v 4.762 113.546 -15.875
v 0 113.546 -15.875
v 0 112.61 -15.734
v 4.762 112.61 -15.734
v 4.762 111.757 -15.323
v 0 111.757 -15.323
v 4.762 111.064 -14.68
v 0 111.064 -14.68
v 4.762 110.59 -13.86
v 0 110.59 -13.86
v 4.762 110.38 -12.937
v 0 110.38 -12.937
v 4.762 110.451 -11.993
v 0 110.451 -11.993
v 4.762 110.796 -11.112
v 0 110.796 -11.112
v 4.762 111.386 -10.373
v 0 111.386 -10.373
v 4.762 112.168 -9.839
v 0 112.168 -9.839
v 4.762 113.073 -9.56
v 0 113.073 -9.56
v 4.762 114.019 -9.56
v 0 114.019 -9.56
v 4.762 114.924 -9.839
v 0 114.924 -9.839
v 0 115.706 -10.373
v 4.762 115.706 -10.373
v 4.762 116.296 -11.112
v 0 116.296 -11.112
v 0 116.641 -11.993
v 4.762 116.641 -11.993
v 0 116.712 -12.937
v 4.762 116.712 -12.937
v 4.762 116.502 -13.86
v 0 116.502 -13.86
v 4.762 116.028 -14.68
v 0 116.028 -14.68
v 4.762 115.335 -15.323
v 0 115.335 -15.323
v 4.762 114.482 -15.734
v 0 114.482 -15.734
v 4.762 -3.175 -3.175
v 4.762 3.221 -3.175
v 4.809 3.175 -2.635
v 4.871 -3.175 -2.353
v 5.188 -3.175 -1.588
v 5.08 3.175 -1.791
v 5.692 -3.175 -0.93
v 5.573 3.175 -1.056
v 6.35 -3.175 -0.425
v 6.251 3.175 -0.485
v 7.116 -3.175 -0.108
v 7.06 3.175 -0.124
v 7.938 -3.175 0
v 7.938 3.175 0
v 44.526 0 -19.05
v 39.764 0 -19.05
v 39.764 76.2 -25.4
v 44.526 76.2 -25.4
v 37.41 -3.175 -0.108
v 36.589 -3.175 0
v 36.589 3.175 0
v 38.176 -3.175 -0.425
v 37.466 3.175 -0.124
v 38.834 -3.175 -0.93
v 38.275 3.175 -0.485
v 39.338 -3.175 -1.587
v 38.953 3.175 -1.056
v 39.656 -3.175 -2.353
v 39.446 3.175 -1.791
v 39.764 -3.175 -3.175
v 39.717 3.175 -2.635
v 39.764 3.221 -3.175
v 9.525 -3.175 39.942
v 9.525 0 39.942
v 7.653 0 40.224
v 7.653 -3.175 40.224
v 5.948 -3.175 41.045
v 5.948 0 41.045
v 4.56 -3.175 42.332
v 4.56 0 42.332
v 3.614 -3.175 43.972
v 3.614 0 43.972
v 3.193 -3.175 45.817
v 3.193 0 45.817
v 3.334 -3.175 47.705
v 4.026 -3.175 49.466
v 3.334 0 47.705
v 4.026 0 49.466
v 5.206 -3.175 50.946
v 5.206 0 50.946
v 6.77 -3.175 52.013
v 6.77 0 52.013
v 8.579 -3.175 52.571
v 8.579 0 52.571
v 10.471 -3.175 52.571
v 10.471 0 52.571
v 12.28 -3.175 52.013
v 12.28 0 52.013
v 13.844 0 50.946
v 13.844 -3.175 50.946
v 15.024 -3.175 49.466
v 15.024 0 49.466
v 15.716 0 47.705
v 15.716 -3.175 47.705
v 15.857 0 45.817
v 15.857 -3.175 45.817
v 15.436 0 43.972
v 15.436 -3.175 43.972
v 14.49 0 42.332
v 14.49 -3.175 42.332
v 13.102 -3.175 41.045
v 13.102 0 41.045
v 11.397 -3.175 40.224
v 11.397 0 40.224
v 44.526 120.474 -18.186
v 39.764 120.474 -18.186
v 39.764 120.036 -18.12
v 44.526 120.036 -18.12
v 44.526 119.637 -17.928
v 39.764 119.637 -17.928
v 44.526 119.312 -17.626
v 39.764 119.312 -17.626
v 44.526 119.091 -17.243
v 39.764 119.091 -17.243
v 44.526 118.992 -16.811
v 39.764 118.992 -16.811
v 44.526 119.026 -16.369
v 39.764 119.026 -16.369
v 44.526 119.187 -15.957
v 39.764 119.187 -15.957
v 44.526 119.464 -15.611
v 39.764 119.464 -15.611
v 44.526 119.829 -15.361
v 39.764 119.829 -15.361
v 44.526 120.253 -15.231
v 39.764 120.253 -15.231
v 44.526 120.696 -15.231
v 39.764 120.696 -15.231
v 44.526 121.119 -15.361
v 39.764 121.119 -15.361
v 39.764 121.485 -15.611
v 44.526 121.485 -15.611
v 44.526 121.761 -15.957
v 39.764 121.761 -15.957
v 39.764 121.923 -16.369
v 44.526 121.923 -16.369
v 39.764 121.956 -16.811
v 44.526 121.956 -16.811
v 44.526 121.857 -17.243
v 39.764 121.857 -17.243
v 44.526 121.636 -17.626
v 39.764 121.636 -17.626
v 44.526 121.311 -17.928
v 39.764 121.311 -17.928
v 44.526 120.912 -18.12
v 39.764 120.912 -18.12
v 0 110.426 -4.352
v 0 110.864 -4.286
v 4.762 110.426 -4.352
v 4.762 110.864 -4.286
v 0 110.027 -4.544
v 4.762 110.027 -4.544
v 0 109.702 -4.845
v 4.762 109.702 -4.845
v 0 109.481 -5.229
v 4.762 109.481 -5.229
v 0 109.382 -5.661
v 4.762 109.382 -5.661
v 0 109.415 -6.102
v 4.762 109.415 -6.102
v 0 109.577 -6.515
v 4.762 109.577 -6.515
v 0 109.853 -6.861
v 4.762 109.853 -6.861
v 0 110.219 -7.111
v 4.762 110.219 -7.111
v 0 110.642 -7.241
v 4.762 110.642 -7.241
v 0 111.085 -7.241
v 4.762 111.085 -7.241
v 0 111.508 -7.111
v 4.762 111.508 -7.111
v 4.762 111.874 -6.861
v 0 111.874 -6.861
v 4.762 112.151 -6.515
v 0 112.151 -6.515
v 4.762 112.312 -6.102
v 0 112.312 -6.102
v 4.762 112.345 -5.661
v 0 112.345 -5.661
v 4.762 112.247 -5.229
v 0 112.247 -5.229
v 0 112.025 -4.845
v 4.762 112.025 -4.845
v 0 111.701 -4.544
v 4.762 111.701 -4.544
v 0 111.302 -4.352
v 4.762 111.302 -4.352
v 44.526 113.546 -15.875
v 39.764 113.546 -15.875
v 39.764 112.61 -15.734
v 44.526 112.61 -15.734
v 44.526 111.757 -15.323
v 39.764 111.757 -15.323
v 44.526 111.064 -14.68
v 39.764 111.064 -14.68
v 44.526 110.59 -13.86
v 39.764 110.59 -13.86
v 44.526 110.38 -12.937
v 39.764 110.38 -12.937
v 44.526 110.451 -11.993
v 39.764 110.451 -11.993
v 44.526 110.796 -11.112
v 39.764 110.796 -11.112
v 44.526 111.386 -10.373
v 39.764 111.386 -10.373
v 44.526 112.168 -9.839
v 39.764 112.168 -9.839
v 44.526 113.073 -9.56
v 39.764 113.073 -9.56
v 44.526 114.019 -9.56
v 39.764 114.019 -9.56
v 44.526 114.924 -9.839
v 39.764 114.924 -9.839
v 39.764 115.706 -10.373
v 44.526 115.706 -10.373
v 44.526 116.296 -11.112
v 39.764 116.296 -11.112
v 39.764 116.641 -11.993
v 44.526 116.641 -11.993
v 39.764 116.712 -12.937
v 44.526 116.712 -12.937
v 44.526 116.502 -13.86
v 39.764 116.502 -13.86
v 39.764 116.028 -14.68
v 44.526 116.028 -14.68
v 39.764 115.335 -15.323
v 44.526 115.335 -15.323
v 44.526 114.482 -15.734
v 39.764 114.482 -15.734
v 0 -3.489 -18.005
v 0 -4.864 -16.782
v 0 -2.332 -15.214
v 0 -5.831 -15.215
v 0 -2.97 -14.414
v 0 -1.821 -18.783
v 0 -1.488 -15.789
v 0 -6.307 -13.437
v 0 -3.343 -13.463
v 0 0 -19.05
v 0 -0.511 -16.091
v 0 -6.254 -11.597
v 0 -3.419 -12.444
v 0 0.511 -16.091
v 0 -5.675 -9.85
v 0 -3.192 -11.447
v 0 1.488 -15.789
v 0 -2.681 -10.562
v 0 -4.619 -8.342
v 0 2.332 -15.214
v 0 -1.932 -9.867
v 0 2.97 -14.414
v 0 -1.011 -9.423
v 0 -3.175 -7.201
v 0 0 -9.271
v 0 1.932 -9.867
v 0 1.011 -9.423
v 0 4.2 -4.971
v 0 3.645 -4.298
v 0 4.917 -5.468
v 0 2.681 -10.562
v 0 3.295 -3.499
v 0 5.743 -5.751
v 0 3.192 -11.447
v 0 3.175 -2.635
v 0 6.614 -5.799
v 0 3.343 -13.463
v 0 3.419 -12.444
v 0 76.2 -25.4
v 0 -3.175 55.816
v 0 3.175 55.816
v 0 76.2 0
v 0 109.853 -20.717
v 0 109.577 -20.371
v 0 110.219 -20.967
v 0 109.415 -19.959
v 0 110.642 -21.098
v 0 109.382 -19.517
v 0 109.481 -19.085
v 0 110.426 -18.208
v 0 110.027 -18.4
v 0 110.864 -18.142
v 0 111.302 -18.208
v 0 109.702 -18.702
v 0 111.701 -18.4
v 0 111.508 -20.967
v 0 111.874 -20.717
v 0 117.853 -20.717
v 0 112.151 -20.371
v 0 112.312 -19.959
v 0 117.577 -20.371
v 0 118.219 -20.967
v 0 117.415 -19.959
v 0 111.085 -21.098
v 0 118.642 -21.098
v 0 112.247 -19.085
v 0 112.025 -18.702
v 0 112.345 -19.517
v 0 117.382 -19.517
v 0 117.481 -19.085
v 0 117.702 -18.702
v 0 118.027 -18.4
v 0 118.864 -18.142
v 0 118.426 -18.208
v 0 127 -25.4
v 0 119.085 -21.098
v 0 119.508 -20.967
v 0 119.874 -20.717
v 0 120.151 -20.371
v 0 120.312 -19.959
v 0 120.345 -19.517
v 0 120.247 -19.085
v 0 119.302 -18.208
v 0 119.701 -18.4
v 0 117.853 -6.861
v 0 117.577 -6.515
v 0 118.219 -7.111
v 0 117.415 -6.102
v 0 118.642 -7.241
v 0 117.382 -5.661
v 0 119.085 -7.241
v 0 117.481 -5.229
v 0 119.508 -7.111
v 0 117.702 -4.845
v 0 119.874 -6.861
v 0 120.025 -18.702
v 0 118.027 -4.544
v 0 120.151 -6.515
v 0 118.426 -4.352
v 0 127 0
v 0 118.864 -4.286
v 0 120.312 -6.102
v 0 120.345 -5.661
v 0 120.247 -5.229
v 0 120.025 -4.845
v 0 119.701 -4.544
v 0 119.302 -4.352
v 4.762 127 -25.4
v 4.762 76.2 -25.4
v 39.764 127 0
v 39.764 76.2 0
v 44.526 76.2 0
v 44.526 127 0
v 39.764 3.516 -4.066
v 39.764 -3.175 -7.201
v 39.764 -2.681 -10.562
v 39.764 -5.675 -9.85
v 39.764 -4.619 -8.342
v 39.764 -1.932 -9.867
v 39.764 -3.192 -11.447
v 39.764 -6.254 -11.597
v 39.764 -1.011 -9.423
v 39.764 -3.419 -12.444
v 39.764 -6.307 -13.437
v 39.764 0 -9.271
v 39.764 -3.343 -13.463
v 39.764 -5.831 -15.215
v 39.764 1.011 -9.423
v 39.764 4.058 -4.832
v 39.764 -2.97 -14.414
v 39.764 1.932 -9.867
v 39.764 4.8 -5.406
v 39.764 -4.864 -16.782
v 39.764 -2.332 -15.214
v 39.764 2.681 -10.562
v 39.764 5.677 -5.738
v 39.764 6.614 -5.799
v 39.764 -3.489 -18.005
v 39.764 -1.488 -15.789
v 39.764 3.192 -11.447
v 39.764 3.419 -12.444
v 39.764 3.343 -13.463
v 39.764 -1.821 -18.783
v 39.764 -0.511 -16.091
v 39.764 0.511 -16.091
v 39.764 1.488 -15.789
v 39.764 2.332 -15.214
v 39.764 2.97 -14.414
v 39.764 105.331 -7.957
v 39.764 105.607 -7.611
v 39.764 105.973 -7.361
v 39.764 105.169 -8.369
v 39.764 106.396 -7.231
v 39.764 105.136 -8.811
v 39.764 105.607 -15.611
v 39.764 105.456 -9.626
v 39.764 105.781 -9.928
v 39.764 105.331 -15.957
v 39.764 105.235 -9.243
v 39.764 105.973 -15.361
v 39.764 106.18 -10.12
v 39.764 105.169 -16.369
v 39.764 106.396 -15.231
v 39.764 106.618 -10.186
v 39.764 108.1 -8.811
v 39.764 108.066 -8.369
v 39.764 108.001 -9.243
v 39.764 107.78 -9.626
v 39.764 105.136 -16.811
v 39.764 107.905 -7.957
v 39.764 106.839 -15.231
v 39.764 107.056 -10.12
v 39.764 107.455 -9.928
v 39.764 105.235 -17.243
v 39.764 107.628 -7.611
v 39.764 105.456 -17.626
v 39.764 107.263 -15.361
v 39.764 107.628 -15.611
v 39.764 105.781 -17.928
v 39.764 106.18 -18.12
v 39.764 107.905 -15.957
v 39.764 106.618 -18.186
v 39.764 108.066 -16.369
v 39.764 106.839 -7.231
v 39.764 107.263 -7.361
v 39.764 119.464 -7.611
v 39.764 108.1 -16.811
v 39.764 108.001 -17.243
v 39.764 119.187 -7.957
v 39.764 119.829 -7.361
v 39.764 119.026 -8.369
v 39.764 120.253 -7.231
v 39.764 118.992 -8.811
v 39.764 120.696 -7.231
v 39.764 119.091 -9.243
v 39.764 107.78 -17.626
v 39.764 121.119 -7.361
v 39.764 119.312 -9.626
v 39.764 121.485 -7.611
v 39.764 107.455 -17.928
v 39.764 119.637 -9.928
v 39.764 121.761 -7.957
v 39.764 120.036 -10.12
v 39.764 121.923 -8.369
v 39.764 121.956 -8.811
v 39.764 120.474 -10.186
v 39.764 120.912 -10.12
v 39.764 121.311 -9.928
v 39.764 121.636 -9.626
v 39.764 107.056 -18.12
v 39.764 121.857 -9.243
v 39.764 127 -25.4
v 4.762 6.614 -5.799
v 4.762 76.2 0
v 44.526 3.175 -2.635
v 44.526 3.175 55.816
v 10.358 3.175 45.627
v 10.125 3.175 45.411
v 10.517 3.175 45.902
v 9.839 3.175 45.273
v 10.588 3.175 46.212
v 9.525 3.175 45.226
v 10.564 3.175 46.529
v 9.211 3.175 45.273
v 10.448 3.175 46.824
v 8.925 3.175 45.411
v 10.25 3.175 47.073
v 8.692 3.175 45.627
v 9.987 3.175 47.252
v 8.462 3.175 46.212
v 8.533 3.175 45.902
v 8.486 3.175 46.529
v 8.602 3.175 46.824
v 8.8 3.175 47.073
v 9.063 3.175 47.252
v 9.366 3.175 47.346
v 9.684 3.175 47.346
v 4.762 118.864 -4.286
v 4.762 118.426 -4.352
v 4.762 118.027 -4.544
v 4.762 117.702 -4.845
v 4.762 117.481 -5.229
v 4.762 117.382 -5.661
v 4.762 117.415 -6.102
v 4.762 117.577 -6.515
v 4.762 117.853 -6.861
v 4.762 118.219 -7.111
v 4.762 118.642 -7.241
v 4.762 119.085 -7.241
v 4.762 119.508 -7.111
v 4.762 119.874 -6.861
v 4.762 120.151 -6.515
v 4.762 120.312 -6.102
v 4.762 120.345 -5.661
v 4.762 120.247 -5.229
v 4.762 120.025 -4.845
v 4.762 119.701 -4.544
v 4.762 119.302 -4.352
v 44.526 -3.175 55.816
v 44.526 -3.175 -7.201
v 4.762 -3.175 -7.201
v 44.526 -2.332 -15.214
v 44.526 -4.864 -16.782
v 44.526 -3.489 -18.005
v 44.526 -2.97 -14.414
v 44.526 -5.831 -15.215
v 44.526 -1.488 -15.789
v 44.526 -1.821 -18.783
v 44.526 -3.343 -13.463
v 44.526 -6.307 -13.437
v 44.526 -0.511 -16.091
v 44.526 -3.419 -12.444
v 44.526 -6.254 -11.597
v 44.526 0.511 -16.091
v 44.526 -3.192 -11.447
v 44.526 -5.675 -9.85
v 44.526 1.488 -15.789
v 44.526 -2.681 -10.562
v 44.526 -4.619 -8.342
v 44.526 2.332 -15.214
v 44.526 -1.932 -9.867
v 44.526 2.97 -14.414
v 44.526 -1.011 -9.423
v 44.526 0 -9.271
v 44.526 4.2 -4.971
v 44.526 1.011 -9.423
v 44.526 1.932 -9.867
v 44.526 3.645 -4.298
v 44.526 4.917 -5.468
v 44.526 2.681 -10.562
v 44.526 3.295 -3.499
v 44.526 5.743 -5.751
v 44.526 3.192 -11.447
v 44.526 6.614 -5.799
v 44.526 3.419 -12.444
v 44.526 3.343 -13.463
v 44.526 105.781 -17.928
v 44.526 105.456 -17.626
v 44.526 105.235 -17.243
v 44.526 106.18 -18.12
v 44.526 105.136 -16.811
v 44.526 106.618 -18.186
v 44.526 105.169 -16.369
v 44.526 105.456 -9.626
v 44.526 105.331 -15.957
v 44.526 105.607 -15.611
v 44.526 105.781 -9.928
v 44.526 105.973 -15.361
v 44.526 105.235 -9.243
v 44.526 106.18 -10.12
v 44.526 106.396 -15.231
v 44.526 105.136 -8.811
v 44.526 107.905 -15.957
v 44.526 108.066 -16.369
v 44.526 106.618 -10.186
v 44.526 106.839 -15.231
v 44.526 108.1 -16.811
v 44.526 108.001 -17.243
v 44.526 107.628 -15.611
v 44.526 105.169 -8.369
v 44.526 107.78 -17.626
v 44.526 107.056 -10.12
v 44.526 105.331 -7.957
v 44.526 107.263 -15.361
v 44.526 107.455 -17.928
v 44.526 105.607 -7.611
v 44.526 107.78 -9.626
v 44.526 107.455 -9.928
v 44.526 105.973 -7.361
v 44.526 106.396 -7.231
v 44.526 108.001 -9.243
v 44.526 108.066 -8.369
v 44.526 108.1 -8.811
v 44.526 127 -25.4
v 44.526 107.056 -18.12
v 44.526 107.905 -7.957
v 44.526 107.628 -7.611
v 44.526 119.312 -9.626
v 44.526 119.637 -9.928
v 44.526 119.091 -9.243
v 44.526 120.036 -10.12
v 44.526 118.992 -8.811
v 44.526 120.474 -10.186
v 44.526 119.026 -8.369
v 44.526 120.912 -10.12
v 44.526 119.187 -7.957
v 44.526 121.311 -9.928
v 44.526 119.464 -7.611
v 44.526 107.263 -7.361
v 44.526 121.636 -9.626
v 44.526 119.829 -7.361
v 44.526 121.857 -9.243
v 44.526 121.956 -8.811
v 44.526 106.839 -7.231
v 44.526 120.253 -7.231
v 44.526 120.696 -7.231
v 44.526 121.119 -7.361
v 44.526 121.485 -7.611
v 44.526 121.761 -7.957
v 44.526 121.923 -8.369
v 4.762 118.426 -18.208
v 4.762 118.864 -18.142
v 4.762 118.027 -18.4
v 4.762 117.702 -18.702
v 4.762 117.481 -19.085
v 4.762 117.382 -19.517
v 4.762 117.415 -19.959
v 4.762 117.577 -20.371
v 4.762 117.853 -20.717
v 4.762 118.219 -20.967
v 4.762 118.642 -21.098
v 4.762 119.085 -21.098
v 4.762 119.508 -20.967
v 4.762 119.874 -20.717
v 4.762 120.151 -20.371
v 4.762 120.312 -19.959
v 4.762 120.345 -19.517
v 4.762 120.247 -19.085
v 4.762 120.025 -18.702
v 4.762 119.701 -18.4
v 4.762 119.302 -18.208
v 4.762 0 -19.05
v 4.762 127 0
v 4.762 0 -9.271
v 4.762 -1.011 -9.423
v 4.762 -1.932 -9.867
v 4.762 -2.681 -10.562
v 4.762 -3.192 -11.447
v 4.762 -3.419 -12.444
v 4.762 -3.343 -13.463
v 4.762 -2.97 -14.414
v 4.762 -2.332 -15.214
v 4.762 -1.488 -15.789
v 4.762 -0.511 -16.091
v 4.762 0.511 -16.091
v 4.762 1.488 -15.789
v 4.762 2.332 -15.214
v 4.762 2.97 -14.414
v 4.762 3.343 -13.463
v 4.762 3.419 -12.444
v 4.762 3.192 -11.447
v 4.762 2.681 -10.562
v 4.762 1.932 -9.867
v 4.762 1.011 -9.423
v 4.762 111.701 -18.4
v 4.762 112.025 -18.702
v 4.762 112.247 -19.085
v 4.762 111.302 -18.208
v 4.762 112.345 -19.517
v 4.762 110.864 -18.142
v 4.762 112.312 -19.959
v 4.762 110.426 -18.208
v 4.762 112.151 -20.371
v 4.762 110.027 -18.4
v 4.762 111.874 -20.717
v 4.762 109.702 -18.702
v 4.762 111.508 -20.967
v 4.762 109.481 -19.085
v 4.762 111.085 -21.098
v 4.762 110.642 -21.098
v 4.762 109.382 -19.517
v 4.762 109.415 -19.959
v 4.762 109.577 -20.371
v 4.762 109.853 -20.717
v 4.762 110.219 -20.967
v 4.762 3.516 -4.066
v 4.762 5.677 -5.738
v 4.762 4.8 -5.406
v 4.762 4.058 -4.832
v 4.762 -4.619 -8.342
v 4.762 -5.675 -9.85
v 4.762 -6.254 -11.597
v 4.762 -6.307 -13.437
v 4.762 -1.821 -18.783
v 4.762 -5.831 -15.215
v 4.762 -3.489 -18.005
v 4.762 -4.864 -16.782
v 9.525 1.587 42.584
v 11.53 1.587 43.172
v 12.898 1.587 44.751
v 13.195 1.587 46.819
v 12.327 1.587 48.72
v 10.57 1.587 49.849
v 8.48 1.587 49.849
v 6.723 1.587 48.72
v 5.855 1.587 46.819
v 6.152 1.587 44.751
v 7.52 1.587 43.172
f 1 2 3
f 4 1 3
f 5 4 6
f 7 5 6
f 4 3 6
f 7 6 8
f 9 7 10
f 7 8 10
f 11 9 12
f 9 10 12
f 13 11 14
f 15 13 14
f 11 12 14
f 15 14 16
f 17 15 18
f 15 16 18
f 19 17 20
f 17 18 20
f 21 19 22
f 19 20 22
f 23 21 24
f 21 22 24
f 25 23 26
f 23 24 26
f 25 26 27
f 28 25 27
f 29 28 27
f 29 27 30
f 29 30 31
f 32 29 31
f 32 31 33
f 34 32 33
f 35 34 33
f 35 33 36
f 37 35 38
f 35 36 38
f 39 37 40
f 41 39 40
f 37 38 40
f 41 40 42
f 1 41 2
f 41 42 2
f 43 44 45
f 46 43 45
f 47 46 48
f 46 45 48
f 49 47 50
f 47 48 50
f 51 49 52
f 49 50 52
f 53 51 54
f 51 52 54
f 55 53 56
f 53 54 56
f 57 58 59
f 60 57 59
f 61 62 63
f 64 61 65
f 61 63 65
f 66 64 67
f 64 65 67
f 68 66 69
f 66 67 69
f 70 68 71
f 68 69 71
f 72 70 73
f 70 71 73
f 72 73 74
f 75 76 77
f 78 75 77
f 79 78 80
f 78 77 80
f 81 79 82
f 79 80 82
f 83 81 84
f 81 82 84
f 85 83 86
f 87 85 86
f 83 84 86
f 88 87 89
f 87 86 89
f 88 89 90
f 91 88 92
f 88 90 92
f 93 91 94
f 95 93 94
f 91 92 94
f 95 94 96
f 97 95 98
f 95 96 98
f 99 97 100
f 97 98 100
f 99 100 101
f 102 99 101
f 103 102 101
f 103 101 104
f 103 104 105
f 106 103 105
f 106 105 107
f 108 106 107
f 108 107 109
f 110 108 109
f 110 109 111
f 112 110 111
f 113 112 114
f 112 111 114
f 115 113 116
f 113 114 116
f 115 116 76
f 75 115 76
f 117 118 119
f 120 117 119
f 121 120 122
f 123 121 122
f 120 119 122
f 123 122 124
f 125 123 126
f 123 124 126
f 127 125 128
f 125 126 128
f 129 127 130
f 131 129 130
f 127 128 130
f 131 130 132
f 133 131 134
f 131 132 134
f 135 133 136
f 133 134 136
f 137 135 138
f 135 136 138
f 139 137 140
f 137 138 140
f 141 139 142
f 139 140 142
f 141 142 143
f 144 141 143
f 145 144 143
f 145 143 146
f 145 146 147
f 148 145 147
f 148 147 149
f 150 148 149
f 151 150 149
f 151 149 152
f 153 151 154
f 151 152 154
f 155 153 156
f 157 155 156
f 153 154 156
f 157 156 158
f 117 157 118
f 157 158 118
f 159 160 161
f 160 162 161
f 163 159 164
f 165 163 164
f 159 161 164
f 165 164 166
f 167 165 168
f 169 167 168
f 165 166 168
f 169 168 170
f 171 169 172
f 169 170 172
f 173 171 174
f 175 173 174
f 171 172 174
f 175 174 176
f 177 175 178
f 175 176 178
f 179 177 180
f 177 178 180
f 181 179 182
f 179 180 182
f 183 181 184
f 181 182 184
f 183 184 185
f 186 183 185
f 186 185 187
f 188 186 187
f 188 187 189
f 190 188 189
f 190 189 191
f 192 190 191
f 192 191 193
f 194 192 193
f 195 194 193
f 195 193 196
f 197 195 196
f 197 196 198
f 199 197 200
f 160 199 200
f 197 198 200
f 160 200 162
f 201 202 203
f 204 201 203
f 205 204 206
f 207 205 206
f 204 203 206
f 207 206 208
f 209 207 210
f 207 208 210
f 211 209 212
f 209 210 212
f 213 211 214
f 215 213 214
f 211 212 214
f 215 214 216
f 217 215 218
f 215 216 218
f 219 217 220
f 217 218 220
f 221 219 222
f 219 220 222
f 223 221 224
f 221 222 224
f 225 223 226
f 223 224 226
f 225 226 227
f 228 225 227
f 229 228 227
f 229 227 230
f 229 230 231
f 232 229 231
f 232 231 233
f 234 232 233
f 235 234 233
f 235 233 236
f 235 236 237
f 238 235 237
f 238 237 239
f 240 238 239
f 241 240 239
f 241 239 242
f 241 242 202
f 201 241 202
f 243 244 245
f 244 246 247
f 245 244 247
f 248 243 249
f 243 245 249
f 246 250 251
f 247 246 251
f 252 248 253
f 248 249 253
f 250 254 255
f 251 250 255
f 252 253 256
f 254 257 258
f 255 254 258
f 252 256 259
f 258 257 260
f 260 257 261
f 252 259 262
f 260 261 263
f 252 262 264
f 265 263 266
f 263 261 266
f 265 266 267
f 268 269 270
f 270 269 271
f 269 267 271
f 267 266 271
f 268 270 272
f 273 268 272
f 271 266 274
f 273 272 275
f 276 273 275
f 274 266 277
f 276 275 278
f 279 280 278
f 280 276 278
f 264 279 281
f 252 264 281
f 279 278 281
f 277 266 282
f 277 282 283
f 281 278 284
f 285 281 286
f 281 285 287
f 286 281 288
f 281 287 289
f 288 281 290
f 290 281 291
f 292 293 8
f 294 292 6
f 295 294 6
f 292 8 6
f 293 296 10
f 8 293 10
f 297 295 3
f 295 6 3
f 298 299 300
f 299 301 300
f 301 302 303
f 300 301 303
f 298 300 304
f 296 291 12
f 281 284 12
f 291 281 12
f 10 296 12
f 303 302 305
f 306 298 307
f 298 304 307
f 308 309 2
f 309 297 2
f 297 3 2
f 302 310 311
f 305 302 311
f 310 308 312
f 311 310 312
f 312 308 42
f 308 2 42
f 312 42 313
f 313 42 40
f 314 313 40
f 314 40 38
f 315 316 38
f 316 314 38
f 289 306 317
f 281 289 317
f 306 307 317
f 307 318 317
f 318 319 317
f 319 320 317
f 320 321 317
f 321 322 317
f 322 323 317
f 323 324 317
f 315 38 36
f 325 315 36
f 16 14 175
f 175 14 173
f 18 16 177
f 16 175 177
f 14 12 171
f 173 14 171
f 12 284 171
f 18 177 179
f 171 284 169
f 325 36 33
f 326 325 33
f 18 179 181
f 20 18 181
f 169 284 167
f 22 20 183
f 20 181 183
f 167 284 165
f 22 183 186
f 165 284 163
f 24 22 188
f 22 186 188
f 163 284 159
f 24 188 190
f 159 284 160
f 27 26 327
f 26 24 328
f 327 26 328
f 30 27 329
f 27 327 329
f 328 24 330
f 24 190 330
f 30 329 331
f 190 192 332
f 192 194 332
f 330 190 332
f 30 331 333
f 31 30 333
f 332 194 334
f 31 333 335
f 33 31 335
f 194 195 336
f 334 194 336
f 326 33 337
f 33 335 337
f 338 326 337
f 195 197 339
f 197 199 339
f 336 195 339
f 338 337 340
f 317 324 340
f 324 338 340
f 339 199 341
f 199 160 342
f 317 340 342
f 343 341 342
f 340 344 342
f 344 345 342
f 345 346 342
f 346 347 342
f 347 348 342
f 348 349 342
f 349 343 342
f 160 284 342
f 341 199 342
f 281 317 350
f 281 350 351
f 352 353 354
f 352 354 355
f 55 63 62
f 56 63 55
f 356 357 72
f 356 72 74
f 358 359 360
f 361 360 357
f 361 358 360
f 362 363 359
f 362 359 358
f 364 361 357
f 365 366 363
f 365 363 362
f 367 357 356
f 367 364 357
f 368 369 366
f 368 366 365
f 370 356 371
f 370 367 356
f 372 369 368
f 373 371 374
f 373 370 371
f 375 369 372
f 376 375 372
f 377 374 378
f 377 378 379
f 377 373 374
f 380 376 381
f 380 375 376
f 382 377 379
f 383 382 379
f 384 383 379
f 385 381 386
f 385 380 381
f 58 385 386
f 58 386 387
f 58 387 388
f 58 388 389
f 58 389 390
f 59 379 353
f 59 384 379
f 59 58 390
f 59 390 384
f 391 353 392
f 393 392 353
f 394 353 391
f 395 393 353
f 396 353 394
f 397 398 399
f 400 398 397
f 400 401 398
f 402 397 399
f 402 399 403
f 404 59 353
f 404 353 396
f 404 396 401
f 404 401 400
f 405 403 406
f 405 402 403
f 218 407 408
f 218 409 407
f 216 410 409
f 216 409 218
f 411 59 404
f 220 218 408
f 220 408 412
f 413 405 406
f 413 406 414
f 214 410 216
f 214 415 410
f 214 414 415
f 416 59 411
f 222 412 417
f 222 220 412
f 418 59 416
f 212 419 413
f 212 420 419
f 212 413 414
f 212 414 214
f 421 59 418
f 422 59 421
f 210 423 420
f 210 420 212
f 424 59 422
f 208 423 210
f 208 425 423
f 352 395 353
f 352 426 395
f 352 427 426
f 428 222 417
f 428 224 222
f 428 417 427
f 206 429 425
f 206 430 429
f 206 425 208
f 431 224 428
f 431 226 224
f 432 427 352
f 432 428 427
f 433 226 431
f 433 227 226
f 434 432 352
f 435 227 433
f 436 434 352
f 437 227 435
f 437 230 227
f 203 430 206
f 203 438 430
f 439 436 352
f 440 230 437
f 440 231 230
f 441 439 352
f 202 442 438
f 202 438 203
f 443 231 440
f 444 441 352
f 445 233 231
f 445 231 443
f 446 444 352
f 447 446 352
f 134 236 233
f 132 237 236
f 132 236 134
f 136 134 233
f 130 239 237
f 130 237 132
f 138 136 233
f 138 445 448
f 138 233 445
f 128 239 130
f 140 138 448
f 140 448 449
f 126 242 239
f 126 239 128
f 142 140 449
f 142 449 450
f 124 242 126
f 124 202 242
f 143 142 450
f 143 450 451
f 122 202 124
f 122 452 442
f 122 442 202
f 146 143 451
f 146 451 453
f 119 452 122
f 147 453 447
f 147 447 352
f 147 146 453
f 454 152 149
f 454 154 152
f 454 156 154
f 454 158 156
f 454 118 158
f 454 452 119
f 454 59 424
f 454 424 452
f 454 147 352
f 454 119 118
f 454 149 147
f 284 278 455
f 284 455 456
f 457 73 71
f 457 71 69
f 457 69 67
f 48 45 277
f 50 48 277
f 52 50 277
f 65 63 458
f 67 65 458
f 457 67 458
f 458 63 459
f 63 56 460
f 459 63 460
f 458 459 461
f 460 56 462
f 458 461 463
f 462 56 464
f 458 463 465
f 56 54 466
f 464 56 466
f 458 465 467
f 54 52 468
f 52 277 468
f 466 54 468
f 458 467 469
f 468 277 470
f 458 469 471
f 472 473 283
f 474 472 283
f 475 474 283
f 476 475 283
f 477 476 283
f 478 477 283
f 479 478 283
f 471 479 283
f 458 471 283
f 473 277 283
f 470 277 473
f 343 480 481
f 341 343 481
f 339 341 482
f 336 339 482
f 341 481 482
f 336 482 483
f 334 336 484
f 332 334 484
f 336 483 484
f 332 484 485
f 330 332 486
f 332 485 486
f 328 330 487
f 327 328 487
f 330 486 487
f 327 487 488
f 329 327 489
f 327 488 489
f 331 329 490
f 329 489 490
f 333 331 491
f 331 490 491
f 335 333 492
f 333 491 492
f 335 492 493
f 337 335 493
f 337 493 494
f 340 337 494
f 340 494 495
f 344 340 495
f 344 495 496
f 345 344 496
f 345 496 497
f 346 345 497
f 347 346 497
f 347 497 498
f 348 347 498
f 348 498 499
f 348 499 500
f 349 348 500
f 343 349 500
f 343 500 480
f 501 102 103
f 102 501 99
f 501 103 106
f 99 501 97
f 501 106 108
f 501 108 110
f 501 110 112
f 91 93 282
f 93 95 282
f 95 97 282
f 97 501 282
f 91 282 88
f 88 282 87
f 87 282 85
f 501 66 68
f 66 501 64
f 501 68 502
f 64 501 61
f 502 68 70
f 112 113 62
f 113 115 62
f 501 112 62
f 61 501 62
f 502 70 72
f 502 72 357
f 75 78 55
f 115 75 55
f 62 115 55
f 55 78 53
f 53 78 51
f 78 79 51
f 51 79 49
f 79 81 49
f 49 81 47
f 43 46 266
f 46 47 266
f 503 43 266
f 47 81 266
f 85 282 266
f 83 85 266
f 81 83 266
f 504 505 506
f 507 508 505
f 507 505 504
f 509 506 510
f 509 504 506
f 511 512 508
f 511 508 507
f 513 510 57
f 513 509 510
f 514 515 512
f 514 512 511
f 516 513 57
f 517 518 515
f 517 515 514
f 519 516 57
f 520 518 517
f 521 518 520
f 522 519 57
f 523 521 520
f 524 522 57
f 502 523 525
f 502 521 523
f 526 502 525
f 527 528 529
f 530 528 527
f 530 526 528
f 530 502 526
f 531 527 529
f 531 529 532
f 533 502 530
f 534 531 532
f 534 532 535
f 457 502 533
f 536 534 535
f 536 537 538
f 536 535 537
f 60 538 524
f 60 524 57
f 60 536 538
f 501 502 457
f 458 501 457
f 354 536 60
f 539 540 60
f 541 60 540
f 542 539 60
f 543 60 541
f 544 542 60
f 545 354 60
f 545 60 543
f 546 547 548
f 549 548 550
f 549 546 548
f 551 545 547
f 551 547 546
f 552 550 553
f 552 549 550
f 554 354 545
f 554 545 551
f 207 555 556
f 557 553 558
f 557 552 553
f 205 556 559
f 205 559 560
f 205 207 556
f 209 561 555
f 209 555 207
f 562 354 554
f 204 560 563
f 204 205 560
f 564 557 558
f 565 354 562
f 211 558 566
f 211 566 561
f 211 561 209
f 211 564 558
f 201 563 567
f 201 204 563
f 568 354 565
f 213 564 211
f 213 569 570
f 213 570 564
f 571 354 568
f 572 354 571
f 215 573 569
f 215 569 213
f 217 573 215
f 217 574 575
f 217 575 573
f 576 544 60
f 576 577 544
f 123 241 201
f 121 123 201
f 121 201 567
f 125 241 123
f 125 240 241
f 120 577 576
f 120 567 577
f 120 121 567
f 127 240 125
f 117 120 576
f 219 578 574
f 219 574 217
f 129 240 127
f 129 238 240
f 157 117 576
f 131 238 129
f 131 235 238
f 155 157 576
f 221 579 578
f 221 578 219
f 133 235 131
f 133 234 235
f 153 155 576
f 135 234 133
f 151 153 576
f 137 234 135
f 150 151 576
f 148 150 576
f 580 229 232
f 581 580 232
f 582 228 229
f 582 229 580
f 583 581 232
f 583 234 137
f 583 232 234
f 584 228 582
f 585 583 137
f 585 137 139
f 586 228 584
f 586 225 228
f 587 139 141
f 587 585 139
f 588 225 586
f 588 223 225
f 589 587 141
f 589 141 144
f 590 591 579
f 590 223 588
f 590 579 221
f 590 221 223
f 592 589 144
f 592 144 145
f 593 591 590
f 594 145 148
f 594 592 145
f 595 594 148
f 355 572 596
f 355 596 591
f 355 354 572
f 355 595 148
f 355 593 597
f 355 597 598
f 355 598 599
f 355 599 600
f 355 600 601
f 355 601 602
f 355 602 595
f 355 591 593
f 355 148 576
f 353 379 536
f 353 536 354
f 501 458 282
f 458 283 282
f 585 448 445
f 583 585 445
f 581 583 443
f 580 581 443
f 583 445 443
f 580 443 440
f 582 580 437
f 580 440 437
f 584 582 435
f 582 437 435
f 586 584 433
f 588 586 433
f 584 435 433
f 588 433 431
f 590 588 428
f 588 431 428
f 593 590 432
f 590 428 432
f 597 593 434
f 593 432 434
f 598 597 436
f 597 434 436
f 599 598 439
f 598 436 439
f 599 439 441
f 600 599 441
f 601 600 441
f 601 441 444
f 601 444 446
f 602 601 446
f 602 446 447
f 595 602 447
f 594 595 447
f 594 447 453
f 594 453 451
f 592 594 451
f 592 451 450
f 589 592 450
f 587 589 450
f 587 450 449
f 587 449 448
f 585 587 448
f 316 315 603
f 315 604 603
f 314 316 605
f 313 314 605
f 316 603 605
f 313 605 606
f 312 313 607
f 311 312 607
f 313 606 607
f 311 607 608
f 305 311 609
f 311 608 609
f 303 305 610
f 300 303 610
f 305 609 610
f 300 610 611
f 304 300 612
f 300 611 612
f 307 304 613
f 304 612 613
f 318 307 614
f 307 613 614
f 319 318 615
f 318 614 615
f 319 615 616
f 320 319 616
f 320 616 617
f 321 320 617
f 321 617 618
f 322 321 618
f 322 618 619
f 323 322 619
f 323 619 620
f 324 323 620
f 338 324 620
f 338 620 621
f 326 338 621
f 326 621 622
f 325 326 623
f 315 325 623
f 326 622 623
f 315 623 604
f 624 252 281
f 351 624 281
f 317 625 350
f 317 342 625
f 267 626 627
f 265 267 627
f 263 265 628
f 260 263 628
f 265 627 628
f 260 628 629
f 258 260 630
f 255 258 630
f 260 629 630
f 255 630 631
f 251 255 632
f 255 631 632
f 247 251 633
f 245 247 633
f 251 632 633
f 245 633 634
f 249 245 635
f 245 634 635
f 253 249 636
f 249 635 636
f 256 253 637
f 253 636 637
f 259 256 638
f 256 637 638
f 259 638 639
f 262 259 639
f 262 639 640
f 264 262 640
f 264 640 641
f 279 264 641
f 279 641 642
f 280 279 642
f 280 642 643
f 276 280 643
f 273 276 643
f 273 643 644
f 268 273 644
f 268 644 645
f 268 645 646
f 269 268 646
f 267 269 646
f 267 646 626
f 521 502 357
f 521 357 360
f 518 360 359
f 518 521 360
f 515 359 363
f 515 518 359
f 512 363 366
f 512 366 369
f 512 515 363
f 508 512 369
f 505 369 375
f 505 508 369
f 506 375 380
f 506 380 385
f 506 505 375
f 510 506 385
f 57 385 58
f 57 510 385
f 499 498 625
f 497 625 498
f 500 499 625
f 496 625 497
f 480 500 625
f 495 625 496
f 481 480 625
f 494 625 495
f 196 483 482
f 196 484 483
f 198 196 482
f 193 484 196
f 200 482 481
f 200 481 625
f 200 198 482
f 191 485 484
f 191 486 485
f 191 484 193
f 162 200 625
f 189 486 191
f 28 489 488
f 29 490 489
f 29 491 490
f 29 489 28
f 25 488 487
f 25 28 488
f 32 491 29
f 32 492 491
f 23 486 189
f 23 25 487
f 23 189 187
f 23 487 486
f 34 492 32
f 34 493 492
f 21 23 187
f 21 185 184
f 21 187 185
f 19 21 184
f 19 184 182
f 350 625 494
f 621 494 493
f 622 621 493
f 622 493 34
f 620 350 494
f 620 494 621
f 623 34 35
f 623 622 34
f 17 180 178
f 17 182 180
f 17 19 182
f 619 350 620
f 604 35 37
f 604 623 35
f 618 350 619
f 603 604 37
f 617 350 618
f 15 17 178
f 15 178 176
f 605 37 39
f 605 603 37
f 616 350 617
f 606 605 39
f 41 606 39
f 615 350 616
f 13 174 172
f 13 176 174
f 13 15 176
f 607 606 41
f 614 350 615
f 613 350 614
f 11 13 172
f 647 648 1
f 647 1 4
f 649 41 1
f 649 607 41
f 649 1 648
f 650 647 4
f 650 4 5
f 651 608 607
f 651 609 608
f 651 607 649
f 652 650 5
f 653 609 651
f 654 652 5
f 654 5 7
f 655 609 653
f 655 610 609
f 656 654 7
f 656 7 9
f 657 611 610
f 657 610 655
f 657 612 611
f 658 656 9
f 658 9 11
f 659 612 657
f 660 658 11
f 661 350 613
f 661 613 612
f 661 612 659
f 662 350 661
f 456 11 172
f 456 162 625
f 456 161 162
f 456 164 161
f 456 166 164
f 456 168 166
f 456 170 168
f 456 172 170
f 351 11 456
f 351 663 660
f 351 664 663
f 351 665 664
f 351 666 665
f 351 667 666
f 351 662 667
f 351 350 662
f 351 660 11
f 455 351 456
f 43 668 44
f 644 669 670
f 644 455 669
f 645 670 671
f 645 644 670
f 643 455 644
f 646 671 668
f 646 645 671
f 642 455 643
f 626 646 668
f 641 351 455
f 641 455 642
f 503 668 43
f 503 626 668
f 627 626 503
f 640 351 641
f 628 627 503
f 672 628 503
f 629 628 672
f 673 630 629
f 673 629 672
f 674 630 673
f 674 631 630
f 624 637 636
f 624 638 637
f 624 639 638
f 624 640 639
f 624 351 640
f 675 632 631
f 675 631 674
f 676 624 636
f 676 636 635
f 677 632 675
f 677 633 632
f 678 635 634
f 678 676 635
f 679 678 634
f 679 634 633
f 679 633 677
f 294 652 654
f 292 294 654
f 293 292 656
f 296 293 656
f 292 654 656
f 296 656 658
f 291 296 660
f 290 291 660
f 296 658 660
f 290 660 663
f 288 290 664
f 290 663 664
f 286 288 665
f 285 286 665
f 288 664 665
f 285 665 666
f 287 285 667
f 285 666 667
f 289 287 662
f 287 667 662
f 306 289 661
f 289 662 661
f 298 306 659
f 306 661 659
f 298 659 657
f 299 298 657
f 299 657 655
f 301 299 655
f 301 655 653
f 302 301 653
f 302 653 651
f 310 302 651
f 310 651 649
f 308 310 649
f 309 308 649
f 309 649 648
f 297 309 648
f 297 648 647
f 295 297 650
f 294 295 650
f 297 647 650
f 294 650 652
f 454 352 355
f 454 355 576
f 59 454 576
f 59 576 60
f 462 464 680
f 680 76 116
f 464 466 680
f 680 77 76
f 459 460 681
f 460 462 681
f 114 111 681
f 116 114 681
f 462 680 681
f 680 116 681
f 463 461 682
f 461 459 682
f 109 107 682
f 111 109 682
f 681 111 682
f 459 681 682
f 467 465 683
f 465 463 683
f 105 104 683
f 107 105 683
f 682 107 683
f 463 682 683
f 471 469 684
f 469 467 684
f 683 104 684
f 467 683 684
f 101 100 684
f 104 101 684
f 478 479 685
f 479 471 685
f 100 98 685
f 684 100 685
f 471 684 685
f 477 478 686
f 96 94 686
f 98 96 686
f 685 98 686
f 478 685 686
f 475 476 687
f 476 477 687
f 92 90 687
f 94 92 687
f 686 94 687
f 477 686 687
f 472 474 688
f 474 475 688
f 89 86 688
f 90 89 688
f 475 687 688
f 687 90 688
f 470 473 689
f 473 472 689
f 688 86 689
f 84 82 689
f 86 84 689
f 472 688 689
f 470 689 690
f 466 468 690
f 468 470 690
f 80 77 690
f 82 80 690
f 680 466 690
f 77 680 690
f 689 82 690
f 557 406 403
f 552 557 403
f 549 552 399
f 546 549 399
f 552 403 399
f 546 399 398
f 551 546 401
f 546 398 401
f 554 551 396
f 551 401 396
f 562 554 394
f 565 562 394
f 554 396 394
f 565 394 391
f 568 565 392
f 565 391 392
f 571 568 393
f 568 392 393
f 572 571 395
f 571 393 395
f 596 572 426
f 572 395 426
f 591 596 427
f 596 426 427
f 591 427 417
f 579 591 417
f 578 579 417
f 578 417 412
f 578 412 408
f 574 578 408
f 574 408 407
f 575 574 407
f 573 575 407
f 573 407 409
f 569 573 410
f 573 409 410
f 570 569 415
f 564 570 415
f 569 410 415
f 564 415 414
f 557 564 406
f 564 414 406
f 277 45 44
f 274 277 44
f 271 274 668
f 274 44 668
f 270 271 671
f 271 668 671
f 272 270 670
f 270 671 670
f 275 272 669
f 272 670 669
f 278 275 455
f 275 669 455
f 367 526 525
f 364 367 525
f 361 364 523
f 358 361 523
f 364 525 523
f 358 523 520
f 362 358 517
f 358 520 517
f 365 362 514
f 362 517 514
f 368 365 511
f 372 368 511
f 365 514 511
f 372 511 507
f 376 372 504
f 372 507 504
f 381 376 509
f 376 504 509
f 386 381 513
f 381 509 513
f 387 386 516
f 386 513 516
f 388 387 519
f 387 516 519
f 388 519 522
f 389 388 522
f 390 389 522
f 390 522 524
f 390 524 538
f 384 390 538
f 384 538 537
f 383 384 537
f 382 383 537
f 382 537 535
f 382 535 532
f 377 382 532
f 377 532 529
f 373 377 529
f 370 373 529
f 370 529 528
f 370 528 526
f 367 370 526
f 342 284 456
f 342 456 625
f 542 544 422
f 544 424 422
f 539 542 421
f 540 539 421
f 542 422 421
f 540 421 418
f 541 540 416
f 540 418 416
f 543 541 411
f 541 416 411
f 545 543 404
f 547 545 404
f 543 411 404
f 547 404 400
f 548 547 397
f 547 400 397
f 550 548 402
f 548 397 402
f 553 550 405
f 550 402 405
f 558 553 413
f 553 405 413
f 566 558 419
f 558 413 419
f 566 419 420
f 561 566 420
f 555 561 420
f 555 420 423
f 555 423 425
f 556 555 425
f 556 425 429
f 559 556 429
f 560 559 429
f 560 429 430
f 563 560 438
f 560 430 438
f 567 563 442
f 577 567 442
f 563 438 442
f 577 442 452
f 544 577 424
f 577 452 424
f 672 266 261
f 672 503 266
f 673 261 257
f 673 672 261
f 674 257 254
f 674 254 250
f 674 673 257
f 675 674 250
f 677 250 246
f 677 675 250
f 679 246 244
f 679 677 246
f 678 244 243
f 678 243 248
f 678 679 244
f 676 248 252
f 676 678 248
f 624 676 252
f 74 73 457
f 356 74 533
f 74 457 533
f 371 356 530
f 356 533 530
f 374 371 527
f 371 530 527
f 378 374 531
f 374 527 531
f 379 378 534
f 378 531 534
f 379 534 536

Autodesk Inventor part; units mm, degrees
ref_plane "YZ Plane" through (0, 0, 0) normal (1, 0, 0) x (0, 1, 0)
ref_plane "XZ Plane" through (0, 0, 0) normal (0, 1, 0) x (-1, 0, 0)
ref_plane "XY Plane" through (0, 0, 0) normal (0, 0, 1) x (1, 0, 0)
sketch "Sketch1" plane through (0, 0, 0) normal (1, 0, 0) x (0, 1, 0)
  line L0 (0, 0) -> (127, 0)
  line L1 (127, 0) -> (127, -25.4)
  line L2 (127, -25.4) -> (0, -25.4)
  line L3 (0, -25.4) -> (0, 0)
  line L4 (0, -6.35) -> (0, -19.05)
  line L5 (0, -6.35) -> (76.2, 0)
  line L6 (0, -19.05) -> (76.2, -25.4)
  dimension "d0" = 127
  dimension "d1" = 25.4
  dimension "d18" = 12.7
  dimension "d19" = 6.35
  dimension "d20" = 50.8
  dimension "d21" = 50.8
ref_plane "Work Plane1" through (44.5262, 0, 0) normal (1, 0, 0) x (0, 0, -1)
sketch "Sketch2" plane through (44.5262, 0, 0) normal (1, 0, 0) x (0, 0, -1)
  line L0 (0, 127) -> (0, 0) projected
  line L1 (0, 0) -> (25.4, 0) projected
  line L2 (25.4, 0) -> (25.4, 127) projected
  line L3 (25.4, 127) -> (0, 127) projected
  line L4 (0, 0) -> (25.4, 0) projected
  circle A0 centre (12.7, 0) radius 6.35
  dimension "d5" = 25.4
  dimension "d6" = 12.7
  dimension "d7" = 12.7
  dimension "d8" = 0
extrude "Extrusion2" add sketch "Sketch2" against normal blind 44.5262 contours A0 L1 | L1 A0
ref_plane "Work Plane2" through (44.5262, 0, 0) normal (1, 0, 0) x (0, 0, -1)
extrude "Extrusion3" add sketch "Sketch1" along normal blind 44.5262 contours L0 L1 L2 L6 L3 L5
sketch "Sketch4" plane through (0, 0, 0) normal (-1, 0, 0) x (0, 0, 1)
  arc A0 (-19.05, 0) -> (-6.35, 0) centre (-12.7, 0) ccw projected
  line L0 (0, 76.2) -> (-6.35, 0) projected
  line L1 (0, 127) -> (0, 76.2) projected
  line L2 (-25.4, 127) -> (0, 127) projected
  line L3 (-25.4, 76.2) -> (-25.4, 127) projected
  line L4 (-19.05, 0) -> (-25.4, 76.2) projected
  point P0 (0, 0)
hole "Hole2" at (0, 0, -12.7) direction (1, 0, 0) diameter 6.858 end through all
sketch "Sketch5" plane through (0, 0, 0) normal (-1, 0, 0) x (0, 0, 1)
  circle A0 centre (-12.7, 0) radius 3.429 projected
  line L0 (0, 76.2) -> (-6.35, 0) projected
  line L1 (0, 127) -> (0, 76.2) projected
  line L2 (-25.4, 127) -> (0, 127) projected
  line L3 (-25.4, 76.2) -> (-25.4, 127) projected
  line L4 (-19.05, 0) -> (-25.4, 76.2) projected
  line L5 (-7.6835, 3.175) -> (55.8165, 3.175)
  line L6 (55.8165, 3.175) -> (55.8165, -3.175)
  line L7 (55.8165, -3.175) -> (-7.6835, -3.175)
  line L8 (-7.6835, -3.175) -> (-7.6835, 3.175)
  arc A1 (-19.05, 0) -> (-6.35, 0) centre (-12.7, 0) ccw projected
  point P0 (0, 0)
  dimension "d31" = 63.5
  dimension "d32" = 6.35
  dimension "d35" = 127
  dimension "d36" = 123.825
  dimension "d95" = 6.858
  dimension "d96" = 5.0165
extrude "Extrusion4" add sketch "Sketch5" against normal blind 44.5262 contours L5 L6 L7 A1 L0 | L0 A1 L7 L8 L5
sketch "Sketch8" plane through (0, 76.2, -25.4) normal (0, 0, -1) x (-1, 0, 0)
  line L0 (0, 0) -> (0, 50.8) projected
  line L1 (0, 50.8) -> (-44.5262, 50.8) projected
  line L2 (-44.5262, 0) -> (-44.5262, 50.8) projected
  line L3 (0, 0) -> (-44.5262, 0) projected
  line L4 (0, -76.2) -> (0, 0) projected
  line L5 (0, 0) -> (-44.5262, 0) projected
  line L6 (-44.5262, -76.2) -> (-44.5262, 0) projected
  line L7 (0, 50.8) -> (-44.5262, 50.8) projected
  line L8 (-39.7637, 50.8) -> (-4.7625, 50.8)
  line L9 (-4.7625, 50.8) -> (-4.7625, -98.425)
  line L10 (-4.7625, -98.425) -> (-39.7637, -98.425)
  line L11 (-39.7637, -98.425) -> (-39.7637, 50.8)
  line L12 (0, -76.2) -> (-44.5262, -76.2) projected
  point P0 (0, -76.2)
  dimension "d41" = 44.5262
  dimension "d43" = 35.0012
  dimension "d44" = 4.7625
  dimension "d45" = 149.225
extrude "Extrusion5" cut sketch "Sketch8" against normal blind 25.4 contours L9 L12 L11 L3 | L3 L11 L1 L9 | L9 L10 L11 L12
fillet "Fillet1" radius 3.175 2 edges at (39.7637, 0, 0) (4.7625, 0, 0)
fillet "Fillet2" radius 3.175 2 edges at (2.3812, 3.175, -6.0854) (42.1449, 3.175, -6.0854)
sketch "Sketch9" plane through (0, 0, 0) normal (-1, 0, 0) x (0, 0, 1)
  line L0 (0, 76.2) -> (-5.7989, 6.6137) projected
  line L1 (0, 127) -> (0, 76.2) projected
  line L2 (-25.4, 127) -> (0, 127) projected
  line L3 (-25.4, 76.2) -> (-25.4, 127) projected
  line L4 (-19.05, 0) -> (-25.4, 76.2) projected
  circle A0 centre (-12.7, 0) radius 3.429 projected
  circle A1 centre (-12.7, 114.8637) radius 8
  line L5 (-19.6282, 118.8637) -> (-5.7718, 118.8637)
  line L6 (-5.7718, 118.8637) -> (-5.7718, 110.8637)
  line L7 (-5.7718, 110.8637) -> (-19.6282, 110.8637)
  line L8 (-19.6282, 110.8637) -> (-19.6282, 118.8637)
  arc A2 (-19.05, 0) -> (-7.2007, -3.175) centre (-12.7, 0) ccw projected
  line L9 (55.8165, -3.175) -> (-7.2007, -3.175) projected
  line L10 (55.8165, 3.175) -> (55.8165, -3.175) projected
  line L11 (-2.6348, 3.175) -> (55.8165, 3.175) projected
  arc A3 (-5.7989, 6.6137) -> (-2.6348, 3.175) centre (-2.6348, 6.35) ccw projected
  point P0 (0, 0)
  dimension "d50" = 16
  dimension "d51" = 25.4
  dimension "d52" = 12.7
  dimension "d53" = 8
  dimension "d54" = 4
hole "Hole3" at (0, 118.8637, -19.6282) at (0, 110.8637, -19.6282) at (0, 118.8637, -5.7718) at (0, 110.8637, -5.7718) direction (1, 0, 0) diameter 2.9718 depth 25.4 tip angle 118
sketch "Sketch10" plane through (44.5262, 0, 0) normal (1, 0, 0) x (0, 0, -1)
  line L0 (19.05, 0) -> (25.4, 76.2) projected
  line L1 (25.4, 76.2) -> (25.4, 127) projected
  line L2 (25.4, 127) -> (0, 127) projected
  line L3 (0, 127) -> (0, 76.2) projected
  line L4 (0, 76.2) -> (5.7989, 6.6137) projected
  circle A0 centre (12.7, 0) radius 3.429 projected
  circle A1 centre (12.7, 113.546) radius 8
  line L5 (16.7, 106.6178) -> (8.7, 106.6178)
  line L6 (8.7, 106.6178) -> (8.7, 120.4742)
  line L7 (8.7, 120.4742) -> (16.7, 120.4742)
  line L8 (16.7, 120.4742) -> (16.7, 106.6178)
  arc A2 (7.2007, -3.175) -> (19.05, 0) centre (12.7, 0) ccw projected
  arc A3 (2.6348, 3.175) -> (5.7989, 6.6137) centre (2.6348, 6.35) ccw projected
  line L9 (2.6348, 3.175) -> (-55.8165, 3.175) projected
  line L10 (-55.8165, 3.175) -> (-55.8165, -3.175) projected
  line L11 (-55.8165, -3.175) -> (7.2007, -3.175) projected
  point P0 (0, 0)
  dimension "d62" = 16
  dimension "d63" = 25.4
  dimension "d64" = 12.7
  dimension "d65" = 8
  dimension "d66" = 4
hole "Hole4" at (44.5262, 106.6178, -16.7) at (44.5262, 106.6178, -8.7) at (44.5262, 120.4742, -8.7) at (44.5262, 120.4742, -16.7) direction (-1, 0, 0) diameter 2.9718 depth 25.4 tip angle 118
sketch "Sketch11" plane through (0, -3.175, -7.2007) normal (0, -1, 0) x (1, 0, 0)
  line L0 (4.7625, 0) -> (4.7625, 4.0257) projected
  arc A0 (7.9375, 7.2007) -> (4.7625, 4.0257) centre (7.9375, 4.0257) ccw projected
  line L1 (7.9375, 7.2007) -> (36.5887, 7.2007) projected
  arc A1 (39.7637, 4.0257) -> (36.5887, 7.2007) centre (36.5887, 4.0257) ccw projected
  line L2 (39.7637, 4.0257) -> (39.7637, 0) projected
  line L3 (44.5262, 63.0172) -> (44.5262, 0) projected
  line L4 (0, 63.0172) -> (44.5262, 63.0172) projected
  line L5 (0, 63.0172) -> (0, 0) projected
  line L6 (44.5262, 0) -> (39.7637, 0) projected
  line L7 (4.7625, 0) -> (0, 0) projected
  point P0 (0, 7.2007)
  point P1 (9.525, 53.4922)
  dimension "d74" = 9.525
  dimension "d75" = 44.5262
  dimension "d97" = 9.525
hole "Hole5" at (9.525, -3.175, 46.2915) direction (0, 1, 0) diameter 12.7 depth 3.175 tip angle 118
sketch "Sketch12" plane through (44.5262, 0, 0) normal (1, 0, 0) x (0, 0, -1)
  circle A0 centre (8.7, 120.4742) radius 1.4859 projected
  circle A1 centre (16.7, 106.6178) radius 1.4859 projected
  circle A2 centre (8.7, 106.6178) radius 1.4859 projected
  circle A3 centre (16.7, 120.4742) radius 1.4859 projected
  line L0 (19.05, 0) -> (25.4, 76.2) projected
  line L1 (25.4, 76.2) -> (25.4, 127) projected
  line L2 (25.4, 127) -> (0, 127) projected
  line L3 (0, 127) -> (0, 76.2) projected
  line L4 (0, 76.2) -> (5.7989, 6.6137) projected
  circle A4 centre (12.7, 0) radius 3.429 projected
  arc A5 (7.2007, -3.175) -> (19.05, 0) centre (12.7, 0) ccw projected
  arc A6 (2.6348, 3.175) -> (5.7989, 6.6137) centre (2.6348, 6.35) ccw projected
  line L5 (2.6348, 3.175) -> (-55.8165, 3.175) projected
  line L6 (-55.8165, 3.175) -> (-55.8165, -3.175) projected
  line L7 (-55.8165, -3.175) -> (7.2007, -3.175) projected
  point P0 (0, 0)
  point P1 (12.7, 113.546)
  dimension "d84" = 25.4
  dimension "d85" = 12.7
  dimension "d86" = 13.8564
  dimension "d87" = 6.9282
hole "Hole6" at (44.5262, 113.546, -12.7) direction (-1, 0, 0) diameter 6.35 end through all
equation "\"d19\" = -0.5 * d18 + 0.5 * d1"
equation "\"d21\" = d20"
equation "\"d7\" = 0.5 * d5"
equation "\"d36\" = d35 - 0.5 * d32"
equation "\"d44\" = -0.5 * d43 + 0.5 * d41"
equation "\"d52\" = 0.5 * d51"
equation "\"d54\" = 0.5 * d53"
equation "\"d64\" = 0.5 * d63"
equation "\"d66\" = 0.5 * d65"
equation "\"d87\" = 0.5 * d86"
properties part number "WheelIntakeMount3.0"
